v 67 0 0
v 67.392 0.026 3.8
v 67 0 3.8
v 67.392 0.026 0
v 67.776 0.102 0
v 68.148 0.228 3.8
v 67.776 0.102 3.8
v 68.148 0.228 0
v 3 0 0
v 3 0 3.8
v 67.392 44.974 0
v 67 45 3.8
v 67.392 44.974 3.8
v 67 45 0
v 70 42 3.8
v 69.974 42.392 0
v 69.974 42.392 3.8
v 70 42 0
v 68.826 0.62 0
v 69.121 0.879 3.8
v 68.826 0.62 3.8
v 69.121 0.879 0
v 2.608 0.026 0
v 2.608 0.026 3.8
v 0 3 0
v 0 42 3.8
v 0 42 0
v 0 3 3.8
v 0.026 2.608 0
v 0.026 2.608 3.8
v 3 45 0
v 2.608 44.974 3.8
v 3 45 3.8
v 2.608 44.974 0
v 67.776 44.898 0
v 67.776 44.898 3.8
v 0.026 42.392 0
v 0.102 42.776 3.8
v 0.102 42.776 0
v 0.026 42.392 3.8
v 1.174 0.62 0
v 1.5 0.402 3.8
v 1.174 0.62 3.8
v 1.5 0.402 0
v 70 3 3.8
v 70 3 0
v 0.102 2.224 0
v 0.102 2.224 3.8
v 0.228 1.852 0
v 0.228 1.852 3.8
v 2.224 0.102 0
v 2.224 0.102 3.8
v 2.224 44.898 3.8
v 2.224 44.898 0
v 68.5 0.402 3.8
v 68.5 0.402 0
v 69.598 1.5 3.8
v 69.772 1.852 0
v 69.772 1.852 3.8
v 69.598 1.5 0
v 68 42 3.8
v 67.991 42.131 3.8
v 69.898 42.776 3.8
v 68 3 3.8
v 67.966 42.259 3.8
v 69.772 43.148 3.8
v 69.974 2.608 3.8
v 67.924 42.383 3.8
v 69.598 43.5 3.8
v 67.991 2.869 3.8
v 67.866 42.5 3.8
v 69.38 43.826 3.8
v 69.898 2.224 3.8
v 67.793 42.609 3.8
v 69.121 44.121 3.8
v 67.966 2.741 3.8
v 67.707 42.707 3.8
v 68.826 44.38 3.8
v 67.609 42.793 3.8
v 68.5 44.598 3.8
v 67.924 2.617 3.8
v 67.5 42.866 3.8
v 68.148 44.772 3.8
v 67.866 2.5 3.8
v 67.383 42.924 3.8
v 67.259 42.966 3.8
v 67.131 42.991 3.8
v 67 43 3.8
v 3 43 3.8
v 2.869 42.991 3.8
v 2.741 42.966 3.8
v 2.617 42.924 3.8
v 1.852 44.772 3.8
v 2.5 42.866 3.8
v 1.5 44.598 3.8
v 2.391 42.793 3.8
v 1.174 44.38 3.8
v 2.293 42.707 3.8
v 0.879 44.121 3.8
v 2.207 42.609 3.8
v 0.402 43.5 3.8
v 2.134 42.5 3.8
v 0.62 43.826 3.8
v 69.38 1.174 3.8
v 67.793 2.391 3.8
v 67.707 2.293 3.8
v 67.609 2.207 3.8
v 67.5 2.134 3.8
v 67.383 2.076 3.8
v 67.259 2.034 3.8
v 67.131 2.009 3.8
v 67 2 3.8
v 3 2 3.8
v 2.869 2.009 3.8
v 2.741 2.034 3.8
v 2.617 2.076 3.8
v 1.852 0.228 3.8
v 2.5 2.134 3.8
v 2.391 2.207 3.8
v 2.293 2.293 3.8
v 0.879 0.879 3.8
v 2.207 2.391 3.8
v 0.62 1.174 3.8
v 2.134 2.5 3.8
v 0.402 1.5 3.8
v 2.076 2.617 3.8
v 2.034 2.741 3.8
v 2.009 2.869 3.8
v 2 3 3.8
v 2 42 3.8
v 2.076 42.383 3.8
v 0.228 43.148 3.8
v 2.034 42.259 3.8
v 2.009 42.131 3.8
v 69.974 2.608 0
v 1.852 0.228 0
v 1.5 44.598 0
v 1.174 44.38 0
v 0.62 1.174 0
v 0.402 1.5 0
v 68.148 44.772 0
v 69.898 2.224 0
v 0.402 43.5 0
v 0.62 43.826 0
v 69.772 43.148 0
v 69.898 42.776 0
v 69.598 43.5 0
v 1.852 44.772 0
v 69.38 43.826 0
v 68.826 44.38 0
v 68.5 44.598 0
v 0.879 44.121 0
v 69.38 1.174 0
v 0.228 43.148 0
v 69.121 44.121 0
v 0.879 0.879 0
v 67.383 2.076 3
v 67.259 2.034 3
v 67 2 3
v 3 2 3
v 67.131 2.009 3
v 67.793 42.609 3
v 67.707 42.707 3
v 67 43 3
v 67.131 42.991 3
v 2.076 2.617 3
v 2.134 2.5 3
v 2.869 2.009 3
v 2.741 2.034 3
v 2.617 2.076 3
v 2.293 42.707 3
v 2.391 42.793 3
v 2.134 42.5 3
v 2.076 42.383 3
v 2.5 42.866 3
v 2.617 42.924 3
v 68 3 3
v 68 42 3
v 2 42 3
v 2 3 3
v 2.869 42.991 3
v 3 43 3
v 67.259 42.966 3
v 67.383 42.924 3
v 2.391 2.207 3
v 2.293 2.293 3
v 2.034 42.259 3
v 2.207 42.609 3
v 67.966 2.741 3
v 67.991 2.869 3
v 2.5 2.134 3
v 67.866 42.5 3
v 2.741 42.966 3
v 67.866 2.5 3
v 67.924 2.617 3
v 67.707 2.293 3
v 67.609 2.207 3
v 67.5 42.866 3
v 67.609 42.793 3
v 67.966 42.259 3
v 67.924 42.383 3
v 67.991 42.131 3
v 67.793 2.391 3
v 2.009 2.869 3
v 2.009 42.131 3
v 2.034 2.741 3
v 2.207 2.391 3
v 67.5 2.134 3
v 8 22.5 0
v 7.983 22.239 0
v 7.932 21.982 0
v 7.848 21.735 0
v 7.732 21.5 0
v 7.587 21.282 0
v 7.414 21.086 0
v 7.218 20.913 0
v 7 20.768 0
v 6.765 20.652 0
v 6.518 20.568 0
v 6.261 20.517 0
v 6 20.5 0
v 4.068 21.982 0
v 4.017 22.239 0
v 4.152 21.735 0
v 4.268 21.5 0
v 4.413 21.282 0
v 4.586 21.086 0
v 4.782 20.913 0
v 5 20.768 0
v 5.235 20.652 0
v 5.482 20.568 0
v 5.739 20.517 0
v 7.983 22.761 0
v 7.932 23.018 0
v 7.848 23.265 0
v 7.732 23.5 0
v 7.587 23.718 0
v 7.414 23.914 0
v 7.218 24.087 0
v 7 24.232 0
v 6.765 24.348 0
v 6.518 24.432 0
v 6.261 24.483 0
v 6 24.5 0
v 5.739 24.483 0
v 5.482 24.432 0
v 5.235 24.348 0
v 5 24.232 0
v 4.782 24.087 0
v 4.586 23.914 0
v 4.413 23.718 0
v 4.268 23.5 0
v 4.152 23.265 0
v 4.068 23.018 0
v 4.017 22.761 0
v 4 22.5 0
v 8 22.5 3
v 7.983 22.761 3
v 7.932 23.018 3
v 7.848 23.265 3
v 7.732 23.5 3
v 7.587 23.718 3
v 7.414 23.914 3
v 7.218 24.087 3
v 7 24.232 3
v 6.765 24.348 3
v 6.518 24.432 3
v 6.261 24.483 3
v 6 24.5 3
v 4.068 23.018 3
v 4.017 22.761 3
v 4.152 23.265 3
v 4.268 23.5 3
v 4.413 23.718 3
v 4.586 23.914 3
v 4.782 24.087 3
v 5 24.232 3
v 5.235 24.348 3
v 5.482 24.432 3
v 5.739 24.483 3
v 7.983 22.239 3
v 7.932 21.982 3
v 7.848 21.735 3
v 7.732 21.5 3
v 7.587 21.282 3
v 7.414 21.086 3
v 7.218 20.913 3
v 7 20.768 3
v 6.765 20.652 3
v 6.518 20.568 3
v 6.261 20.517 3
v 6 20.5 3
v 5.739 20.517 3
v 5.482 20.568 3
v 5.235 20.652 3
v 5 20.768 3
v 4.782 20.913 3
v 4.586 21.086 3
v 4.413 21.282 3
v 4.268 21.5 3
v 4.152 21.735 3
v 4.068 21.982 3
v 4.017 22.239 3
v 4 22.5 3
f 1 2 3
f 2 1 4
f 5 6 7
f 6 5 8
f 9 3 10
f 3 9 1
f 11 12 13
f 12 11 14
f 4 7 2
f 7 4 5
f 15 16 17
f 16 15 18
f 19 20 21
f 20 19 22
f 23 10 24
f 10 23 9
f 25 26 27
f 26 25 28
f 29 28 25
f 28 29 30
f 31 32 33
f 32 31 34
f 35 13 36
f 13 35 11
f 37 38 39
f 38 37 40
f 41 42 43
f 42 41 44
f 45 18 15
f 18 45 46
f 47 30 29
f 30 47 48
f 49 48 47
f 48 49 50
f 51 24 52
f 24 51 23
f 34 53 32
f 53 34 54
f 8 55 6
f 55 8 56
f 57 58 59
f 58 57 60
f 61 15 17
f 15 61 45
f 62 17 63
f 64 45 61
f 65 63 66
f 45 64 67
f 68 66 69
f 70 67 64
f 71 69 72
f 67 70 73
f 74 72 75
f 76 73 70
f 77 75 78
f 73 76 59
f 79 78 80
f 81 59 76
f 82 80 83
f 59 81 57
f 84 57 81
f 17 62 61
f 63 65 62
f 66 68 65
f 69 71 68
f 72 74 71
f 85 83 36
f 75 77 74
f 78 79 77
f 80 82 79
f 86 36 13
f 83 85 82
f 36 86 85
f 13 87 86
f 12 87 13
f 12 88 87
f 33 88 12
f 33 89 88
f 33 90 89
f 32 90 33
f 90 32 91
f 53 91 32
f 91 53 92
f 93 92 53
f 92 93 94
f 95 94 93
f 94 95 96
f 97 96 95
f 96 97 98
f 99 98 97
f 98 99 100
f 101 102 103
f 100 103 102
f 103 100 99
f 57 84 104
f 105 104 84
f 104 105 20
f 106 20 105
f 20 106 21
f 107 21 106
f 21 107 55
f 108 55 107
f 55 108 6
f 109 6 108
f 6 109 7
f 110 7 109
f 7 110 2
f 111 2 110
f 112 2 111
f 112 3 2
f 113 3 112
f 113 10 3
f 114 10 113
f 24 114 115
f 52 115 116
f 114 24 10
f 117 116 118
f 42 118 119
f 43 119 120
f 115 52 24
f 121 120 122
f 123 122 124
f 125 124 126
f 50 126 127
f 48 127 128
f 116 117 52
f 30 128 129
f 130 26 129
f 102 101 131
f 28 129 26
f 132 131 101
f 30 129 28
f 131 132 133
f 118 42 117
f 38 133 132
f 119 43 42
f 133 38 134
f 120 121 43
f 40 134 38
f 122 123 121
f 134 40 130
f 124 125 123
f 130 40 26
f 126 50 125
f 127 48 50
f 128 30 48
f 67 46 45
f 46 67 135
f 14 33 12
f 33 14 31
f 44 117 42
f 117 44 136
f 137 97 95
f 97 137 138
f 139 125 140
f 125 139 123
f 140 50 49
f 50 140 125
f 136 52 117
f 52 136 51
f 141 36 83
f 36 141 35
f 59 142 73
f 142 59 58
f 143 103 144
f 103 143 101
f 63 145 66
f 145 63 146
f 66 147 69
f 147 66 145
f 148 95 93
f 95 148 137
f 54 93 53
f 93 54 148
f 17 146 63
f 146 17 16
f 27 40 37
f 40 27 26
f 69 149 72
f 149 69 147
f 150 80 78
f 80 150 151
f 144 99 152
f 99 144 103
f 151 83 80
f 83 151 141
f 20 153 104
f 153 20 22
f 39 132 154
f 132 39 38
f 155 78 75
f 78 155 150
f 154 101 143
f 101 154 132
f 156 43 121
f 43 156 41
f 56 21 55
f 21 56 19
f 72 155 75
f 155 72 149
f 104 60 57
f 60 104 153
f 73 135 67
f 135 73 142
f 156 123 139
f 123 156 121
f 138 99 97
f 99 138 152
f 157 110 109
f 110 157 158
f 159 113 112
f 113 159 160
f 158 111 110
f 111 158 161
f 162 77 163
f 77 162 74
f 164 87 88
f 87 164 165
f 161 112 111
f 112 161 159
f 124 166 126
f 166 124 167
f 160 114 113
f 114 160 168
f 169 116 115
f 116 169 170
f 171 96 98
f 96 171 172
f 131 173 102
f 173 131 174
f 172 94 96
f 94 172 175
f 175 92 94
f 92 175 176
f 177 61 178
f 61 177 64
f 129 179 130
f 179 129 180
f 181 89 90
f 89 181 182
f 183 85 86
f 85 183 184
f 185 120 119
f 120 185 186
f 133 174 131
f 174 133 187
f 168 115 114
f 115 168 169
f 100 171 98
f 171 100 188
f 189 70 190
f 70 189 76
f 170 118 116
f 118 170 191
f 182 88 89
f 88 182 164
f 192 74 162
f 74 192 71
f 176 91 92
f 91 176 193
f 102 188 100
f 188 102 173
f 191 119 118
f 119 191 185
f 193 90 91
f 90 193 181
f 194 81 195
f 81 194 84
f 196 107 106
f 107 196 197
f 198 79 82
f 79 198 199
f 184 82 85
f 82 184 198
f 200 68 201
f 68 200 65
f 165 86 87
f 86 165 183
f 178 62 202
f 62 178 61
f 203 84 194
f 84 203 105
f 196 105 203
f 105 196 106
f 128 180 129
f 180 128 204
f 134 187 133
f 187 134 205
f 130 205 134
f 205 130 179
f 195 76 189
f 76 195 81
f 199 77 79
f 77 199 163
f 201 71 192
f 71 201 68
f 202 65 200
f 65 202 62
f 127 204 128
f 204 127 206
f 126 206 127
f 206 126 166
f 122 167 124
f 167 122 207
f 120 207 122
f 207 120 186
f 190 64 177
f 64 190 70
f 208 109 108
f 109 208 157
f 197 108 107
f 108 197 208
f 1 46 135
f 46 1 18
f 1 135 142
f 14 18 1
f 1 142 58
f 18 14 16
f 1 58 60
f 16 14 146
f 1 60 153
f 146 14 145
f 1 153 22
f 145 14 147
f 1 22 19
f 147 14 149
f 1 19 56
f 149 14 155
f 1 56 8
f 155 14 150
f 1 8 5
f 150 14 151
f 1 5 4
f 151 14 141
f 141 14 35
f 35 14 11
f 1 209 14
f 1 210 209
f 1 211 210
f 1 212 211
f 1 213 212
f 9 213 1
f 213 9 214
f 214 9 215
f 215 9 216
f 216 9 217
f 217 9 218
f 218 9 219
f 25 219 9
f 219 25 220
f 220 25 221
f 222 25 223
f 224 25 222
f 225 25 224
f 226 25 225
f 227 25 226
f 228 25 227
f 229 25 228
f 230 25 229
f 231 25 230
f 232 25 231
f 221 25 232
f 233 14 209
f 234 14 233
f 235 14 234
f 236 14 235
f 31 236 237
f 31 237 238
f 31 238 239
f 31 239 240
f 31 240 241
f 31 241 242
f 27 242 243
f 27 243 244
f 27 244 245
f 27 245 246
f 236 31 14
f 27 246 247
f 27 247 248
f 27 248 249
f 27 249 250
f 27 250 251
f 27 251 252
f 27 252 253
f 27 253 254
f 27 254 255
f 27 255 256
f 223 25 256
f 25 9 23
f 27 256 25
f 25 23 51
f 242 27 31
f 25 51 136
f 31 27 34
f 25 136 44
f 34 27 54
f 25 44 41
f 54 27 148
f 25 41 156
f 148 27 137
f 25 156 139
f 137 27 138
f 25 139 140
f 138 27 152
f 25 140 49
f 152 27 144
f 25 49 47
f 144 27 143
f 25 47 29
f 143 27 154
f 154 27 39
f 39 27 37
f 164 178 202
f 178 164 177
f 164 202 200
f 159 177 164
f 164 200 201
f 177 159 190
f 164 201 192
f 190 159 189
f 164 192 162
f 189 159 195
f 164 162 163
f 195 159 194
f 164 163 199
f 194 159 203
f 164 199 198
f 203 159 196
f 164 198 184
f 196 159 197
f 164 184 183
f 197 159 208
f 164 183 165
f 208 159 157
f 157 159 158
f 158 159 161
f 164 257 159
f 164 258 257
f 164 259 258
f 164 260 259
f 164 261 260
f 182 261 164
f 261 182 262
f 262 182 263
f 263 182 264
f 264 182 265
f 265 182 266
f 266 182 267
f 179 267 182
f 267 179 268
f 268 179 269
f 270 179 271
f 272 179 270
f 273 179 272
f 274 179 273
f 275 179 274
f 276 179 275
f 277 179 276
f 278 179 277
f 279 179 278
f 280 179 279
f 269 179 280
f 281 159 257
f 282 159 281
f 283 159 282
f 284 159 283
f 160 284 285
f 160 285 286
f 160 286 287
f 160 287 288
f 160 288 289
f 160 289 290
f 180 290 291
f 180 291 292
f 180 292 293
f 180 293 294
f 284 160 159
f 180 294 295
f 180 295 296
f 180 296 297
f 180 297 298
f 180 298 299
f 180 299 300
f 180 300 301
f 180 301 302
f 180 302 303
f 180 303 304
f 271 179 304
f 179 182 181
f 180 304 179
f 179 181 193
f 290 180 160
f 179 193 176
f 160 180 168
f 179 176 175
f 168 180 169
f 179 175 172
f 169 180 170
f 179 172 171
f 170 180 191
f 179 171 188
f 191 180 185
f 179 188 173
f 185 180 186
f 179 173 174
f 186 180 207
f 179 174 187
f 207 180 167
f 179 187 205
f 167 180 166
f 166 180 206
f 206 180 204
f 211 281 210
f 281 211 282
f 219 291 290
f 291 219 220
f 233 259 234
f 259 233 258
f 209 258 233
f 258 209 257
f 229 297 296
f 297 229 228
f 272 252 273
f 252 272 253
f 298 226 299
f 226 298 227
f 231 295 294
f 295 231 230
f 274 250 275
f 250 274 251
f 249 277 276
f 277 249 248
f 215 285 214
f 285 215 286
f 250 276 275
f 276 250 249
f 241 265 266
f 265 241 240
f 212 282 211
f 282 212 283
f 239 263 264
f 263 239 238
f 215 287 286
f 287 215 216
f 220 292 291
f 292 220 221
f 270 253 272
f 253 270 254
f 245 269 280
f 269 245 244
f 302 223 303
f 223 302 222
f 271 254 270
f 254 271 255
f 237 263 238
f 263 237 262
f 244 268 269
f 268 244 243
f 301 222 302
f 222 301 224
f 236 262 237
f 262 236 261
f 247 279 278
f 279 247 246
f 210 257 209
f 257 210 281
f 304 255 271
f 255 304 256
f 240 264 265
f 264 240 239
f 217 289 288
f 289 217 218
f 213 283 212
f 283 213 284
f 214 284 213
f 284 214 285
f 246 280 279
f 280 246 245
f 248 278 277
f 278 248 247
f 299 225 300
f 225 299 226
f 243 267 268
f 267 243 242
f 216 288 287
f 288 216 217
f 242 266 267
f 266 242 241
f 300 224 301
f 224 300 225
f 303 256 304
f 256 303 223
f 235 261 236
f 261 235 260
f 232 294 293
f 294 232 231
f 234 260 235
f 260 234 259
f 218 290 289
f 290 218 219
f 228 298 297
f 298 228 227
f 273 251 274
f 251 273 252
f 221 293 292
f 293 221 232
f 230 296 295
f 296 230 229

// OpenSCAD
// ===========================================================================
// Template Tile - the starting point for a new tile
// ===========================================================================
//
// What it makes: a label plate with a raised border a finger can find, an
// optional picture on the face, and an optional hanging hole.
//
// What it is FOR: copying. Take this whole folder, rename it, and change
// everything in it. The long comments below explain what each part of the
// file is doing and why the app cares. Read them once, then replace them with
// comments about your own design.
//
// The folder is named `_template` with a leading underscore, which is how the
// app knows it is not a tile anyone should be offered on the welcome screen.
// Your copy should NOT start with an underscore.
//
// Full walkthrough: docs/guides/TILE_AUTHOR_GUIDE.md
//
// License: CC0-1.0 - this template is public domain so you can take it
// anywhere. Your tile declares its own license in manifest.json.

// ---------------------------------------------------------------------------
// PARAMETER GROUPS
//
// A line like /* [Label] */ starts a group. Everything under it becomes one
// collapsible section of controls in the app, in the order you write them.
//
// The VARIABLE NAME becomes the control's label, with the underscores turned
// into spaces: label_width reads as "label width". Name them in plain words.
//
// The COMMENT DIRECTLY ABOVE becomes the description under that label, and the
// text behind the control's help button - so write it for the person using the
// app, not for the person reading the code. End it with a unit in brackets and
// the app shows the unit beside the value.
//
// The comment AFTER the value, in [square brackets], decides what kind of
// control it is: a slider, a checkbox, a menu, or a file picker.
// ---------------------------------------------------------------------------

/* [Label] */

// Width of the label (mm)
label_width = 70; // [30:1:150]

// Depth of the label (mm)
label_depth = 45; // [20:1:120]

// How thick the flat plate is (mm)
plate_thickness = 3; // [1.2:0.1:10]

// Rounded corners (0 for sharp corners)
corner_radius = 3; // [0:0.5:12]

/* [Picture] */

// A parameter annotated [file:...] becomes a file picker in the app. The
// person using it can upload their own, or pick one you shipped beside this
// file. Leave the default empty and the label prints plain.
//
// IF YOU GIVE THIS A DEFAULT FILE NAME, that file must be listed in
// manifest.json under "files". A first-party tile in this repository once
// shipped without doing that: the file was right there in the folder, the
// manifest named it, and the app still could not find it, because a second
// list had gone out of step. The validator checks this for you now
// (scripts/validate-example.mjs).

// Picture to put on the label (SVG, PNG or JPG; leave empty for none)
picture_file = ""; // [file:svg,png,jpg]

// Cut the picture into the face, or raise it above the face
picture_style = "engraved"; // [engraved, raised]

// How deep to cut, or how high to raise (mm)
picture_depth = 0.8; // [0.2:0.1:3]

// Picture width (0 = fit it to the label)
picture_width = 0; // [0:1:150]

/* [Tactile edge] */

// ---------------------------------------------------------------------------
// TACTILE VALUES - READ THIS BEFORE YOU CHANGE ANY NUMBER IN THIS GROUP.
//
// This border is here to be FOUND BY TOUCH. That makes its height a value
// somebody's fingers depend on, and values like that are not yours or mine to
// pick from feel. They come from the published standard that governs the
// design - the braille specification this project ships, the signage standard
// an installation has to meet, whatever applies to what you are making.
//
// The rules this project works to:
//
//   * Every dimension that affects readability by touch, grip, or how hard
//     something is to press is a PARAMETER with a documented safe minimum and
//     maximum - never a number typed straight into the geometry.
//   * The minimum and maximum come FROM THE SPEC. Never invented, never
//     copied from another tile, and never widened to make a render succeed.
//   * An assert() enforces them, so a value outside the range fails the build
//     instead of quietly printing something nobody can read.
//
// The two numbers at the bottom of this file (ridge_height_min and
// ridge_height_max) are PLACEHOLDERS, and they are deliberately generic. They
// exist so the assert has something to check while you are learning the shape
// of the file. Replace them with your spec's numbers, and cite the spec in the
// comment beside them.
//
// Why this matters more than the rest of the file: nothing in the build catches
// a wrong tactile number. A part with dots too tall reads as mush and a part
// with dots too short reads as nothing, and both of them export, print, and
// look fine in the preview. Only a finger finds out, and by then it is a
// printed object in somebody's hand.
// ---------------------------------------------------------------------------

// Height of the raised border (mm; 0 for no border)
// Documented range: ridge_height_min to ridge_height_max, at the end of this
// file. Replace those with your governing spec's numbers.
ridge_height = 0.8; // [0:0.05:1.5]

// How wide the border sits on the plate (mm)
ridge_width = 2; // [1.2:0.1:8]

/* [Mounting] */

// Add a hole for a keyring or hook
hanging_hole = "yes"; // [yes, no]

// Hole diameter (mm)
hole_diameter = 4; // [3:0.5:8]

/* [Quality] */

// Curve smoothness. Higher is smoother and slower. Surfaces people touch want
// this high enough that the facets cannot be felt.
$fn = 48; // [24:8:128]

/* [Hidden] */

// Everything below this line is computed, and the app does not show it as a
// control. Put your maths, your constants and your modules here.

// Overlap for boolean operations. Two faces that touch exactly are ambiguous
// to the geometry engine and can export as a hole; a hundredth of a millimeter
// of overlap is the fix.
_fuse = 0.01;

// The thinnest wall this design will print reliably on a normal FDM printer.
_min_wall = 1.2;

// TACTILE RANGE - PLACEHOLDERS. Replace both numbers with the minimum and
// maximum from the standard that governs your design, and name that standard
// here so the next person can check it:
//   Source: (none yet - this is template placeholder material)
ridge_height_min = 0.5;
ridge_height_max = 1.5;

// ---------------------------------------------------------------------------
// ASSERTS
//
// An assert() that fails stops the render with your message, which is exactly
// what you want: a build that fails loudly beats a part that fails quietly.
// The headless check this project runs treats a failed assert as a failed
// build, and that is the point.
// ---------------------------------------------------------------------------

assert(
    plate_thickness >= _min_wall,
    str("plate_thickness is ", plate_thickness, " mm, thinner than the ",
        _min_wall, " mm minimum wall this design prints reliably")
);

assert(
    ridge_height == 0 || (ridge_height >= ridge_height_min && ridge_height <= ridge_height_max),
    str("ridge_height is ", ridge_height, " mm, outside the documented range ",
        ridge_height_min, " to ", ridge_height_max,
        " mm - a border outside that range is not the one this design was checked for")
);

assert(
    ridge_width >= _min_wall,
    str("ridge_width is ", ridge_width, " mm, thinner than the ", _min_wall,
        " mm minimum wall this design prints reliably")
);

assert(
    picture_depth < plate_thickness,
    str("picture_depth is ", picture_depth,
        " mm, which would cut straight through a plate ", plate_thickness, " mm thick")
);

assert(
    label_width > 2 * corner_radius && label_depth > 2 * corner_radius,
    "corner_radius is too large for a label this size"
);

has_picture = picture_file != "";

// The area inside the border, less a small margin, is the part of the face a
// picture may use.
_picture_margin = 2;
border_inset = ridge_height > 0 ? ridge_width : 0;
usable_width = label_width - 2 * border_inset - 2 * _picture_margin;
usable_depth = label_depth - 2 * border_inset - 2 * _picture_margin;

// An imported picture's proportions are whatever the person who drew it chose,
// and you cannot measure them from here. Fitting to the SHORTER side is what
// keeps a tall picture from running off a wide label. The intersection() in
// picture_2d() is the belt to this bracer: whatever comes in, the engraving
// stays on the face and never reaches the border or the side wall.
effective_picture_width = picture_width > 0 ? picture_width : min(usable_width, usable_depth);

hole_x = border_inset + 2 + hole_diameter / 2;
total_height = plate_thickness + ridge_height;

// ---------------------------------------------------------------------------
// ECHO
//
// echo() prints to the console, including in headless runs, where the lines
// start with ECHO:. It is how you check a computed value without opening
// anything. Report the numbers a person would want to know before printing.
// ---------------------------------------------------------------------------

echo(str("Finished label: ", label_width, " x ", label_depth, " x ",
         total_height, " mm"));
echo(str("Tactile border height: ", ridge_height,
         " mm (documented range ", ridge_height_min, " to ",
         ridge_height_max, " mm)"));
echo(str("Picture: ", has_picture ? picture_file : "none",
         has_picture ? str(" fitted to ", effective_picture_width, " mm wide") : ""));

// ---------------------------------------------------------------------------
// GEOMETRY
// ---------------------------------------------------------------------------

module rounded_slab(w, d, h, r) {
    translate([r, r, 0])
        linear_extrude(height = h)
            offset(r = r)
                square([w - 2 * r, d - 2 * r]);
}

module edge_ridge() {
    if (ridge_height > 0) {
        translate([0, 0, plate_thickness - _fuse])
            difference() {
                rounded_slab(label_width, label_depth,
                             ridge_height + _fuse, corner_radius);
                translate([ridge_width, ridge_width, -_fuse])
                    rounded_slab(label_width - 2 * ridge_width,
                                 label_depth - 2 * ridge_width,
                                 ridge_height + 3 * _fuse,
                                 max(corner_radius - ridge_width, 0));
            }
    }
}

module picture_2d() {
    intersection() {
        resize([effective_picture_width, 0], auto = true)
            import(picture_file, center = true);
        square([usable_width, usable_depth], center = true);
    }
}

module picture_solid(height) {
    translate([label_width / 2, label_depth / 2, 0])
        linear_extrude(height = height)
            picture_2d();
}

module label() {
    difference() {
        union() {
            rounded_slab(label_width, label_depth, plate_thickness, corner_radius);
            edge_ridge();
            if (has_picture && picture_style == "raised")
                translate([0, 0, plate_thickness - _fuse])
                    picture_solid(picture_depth + _fuse);
        }

        if (has_picture && picture_style == "engraved")
            translate([0, 0, plate_thickness - picture_depth])
                picture_solid(picture_depth + _fuse);

        if (hanging_hole == "yes")
            translate([hole_x, label_depth / 2, -_fuse])
                cylinder(d = hole_diameter,
                         h = total_height + 2 * _fuse);
    }
}

label();
